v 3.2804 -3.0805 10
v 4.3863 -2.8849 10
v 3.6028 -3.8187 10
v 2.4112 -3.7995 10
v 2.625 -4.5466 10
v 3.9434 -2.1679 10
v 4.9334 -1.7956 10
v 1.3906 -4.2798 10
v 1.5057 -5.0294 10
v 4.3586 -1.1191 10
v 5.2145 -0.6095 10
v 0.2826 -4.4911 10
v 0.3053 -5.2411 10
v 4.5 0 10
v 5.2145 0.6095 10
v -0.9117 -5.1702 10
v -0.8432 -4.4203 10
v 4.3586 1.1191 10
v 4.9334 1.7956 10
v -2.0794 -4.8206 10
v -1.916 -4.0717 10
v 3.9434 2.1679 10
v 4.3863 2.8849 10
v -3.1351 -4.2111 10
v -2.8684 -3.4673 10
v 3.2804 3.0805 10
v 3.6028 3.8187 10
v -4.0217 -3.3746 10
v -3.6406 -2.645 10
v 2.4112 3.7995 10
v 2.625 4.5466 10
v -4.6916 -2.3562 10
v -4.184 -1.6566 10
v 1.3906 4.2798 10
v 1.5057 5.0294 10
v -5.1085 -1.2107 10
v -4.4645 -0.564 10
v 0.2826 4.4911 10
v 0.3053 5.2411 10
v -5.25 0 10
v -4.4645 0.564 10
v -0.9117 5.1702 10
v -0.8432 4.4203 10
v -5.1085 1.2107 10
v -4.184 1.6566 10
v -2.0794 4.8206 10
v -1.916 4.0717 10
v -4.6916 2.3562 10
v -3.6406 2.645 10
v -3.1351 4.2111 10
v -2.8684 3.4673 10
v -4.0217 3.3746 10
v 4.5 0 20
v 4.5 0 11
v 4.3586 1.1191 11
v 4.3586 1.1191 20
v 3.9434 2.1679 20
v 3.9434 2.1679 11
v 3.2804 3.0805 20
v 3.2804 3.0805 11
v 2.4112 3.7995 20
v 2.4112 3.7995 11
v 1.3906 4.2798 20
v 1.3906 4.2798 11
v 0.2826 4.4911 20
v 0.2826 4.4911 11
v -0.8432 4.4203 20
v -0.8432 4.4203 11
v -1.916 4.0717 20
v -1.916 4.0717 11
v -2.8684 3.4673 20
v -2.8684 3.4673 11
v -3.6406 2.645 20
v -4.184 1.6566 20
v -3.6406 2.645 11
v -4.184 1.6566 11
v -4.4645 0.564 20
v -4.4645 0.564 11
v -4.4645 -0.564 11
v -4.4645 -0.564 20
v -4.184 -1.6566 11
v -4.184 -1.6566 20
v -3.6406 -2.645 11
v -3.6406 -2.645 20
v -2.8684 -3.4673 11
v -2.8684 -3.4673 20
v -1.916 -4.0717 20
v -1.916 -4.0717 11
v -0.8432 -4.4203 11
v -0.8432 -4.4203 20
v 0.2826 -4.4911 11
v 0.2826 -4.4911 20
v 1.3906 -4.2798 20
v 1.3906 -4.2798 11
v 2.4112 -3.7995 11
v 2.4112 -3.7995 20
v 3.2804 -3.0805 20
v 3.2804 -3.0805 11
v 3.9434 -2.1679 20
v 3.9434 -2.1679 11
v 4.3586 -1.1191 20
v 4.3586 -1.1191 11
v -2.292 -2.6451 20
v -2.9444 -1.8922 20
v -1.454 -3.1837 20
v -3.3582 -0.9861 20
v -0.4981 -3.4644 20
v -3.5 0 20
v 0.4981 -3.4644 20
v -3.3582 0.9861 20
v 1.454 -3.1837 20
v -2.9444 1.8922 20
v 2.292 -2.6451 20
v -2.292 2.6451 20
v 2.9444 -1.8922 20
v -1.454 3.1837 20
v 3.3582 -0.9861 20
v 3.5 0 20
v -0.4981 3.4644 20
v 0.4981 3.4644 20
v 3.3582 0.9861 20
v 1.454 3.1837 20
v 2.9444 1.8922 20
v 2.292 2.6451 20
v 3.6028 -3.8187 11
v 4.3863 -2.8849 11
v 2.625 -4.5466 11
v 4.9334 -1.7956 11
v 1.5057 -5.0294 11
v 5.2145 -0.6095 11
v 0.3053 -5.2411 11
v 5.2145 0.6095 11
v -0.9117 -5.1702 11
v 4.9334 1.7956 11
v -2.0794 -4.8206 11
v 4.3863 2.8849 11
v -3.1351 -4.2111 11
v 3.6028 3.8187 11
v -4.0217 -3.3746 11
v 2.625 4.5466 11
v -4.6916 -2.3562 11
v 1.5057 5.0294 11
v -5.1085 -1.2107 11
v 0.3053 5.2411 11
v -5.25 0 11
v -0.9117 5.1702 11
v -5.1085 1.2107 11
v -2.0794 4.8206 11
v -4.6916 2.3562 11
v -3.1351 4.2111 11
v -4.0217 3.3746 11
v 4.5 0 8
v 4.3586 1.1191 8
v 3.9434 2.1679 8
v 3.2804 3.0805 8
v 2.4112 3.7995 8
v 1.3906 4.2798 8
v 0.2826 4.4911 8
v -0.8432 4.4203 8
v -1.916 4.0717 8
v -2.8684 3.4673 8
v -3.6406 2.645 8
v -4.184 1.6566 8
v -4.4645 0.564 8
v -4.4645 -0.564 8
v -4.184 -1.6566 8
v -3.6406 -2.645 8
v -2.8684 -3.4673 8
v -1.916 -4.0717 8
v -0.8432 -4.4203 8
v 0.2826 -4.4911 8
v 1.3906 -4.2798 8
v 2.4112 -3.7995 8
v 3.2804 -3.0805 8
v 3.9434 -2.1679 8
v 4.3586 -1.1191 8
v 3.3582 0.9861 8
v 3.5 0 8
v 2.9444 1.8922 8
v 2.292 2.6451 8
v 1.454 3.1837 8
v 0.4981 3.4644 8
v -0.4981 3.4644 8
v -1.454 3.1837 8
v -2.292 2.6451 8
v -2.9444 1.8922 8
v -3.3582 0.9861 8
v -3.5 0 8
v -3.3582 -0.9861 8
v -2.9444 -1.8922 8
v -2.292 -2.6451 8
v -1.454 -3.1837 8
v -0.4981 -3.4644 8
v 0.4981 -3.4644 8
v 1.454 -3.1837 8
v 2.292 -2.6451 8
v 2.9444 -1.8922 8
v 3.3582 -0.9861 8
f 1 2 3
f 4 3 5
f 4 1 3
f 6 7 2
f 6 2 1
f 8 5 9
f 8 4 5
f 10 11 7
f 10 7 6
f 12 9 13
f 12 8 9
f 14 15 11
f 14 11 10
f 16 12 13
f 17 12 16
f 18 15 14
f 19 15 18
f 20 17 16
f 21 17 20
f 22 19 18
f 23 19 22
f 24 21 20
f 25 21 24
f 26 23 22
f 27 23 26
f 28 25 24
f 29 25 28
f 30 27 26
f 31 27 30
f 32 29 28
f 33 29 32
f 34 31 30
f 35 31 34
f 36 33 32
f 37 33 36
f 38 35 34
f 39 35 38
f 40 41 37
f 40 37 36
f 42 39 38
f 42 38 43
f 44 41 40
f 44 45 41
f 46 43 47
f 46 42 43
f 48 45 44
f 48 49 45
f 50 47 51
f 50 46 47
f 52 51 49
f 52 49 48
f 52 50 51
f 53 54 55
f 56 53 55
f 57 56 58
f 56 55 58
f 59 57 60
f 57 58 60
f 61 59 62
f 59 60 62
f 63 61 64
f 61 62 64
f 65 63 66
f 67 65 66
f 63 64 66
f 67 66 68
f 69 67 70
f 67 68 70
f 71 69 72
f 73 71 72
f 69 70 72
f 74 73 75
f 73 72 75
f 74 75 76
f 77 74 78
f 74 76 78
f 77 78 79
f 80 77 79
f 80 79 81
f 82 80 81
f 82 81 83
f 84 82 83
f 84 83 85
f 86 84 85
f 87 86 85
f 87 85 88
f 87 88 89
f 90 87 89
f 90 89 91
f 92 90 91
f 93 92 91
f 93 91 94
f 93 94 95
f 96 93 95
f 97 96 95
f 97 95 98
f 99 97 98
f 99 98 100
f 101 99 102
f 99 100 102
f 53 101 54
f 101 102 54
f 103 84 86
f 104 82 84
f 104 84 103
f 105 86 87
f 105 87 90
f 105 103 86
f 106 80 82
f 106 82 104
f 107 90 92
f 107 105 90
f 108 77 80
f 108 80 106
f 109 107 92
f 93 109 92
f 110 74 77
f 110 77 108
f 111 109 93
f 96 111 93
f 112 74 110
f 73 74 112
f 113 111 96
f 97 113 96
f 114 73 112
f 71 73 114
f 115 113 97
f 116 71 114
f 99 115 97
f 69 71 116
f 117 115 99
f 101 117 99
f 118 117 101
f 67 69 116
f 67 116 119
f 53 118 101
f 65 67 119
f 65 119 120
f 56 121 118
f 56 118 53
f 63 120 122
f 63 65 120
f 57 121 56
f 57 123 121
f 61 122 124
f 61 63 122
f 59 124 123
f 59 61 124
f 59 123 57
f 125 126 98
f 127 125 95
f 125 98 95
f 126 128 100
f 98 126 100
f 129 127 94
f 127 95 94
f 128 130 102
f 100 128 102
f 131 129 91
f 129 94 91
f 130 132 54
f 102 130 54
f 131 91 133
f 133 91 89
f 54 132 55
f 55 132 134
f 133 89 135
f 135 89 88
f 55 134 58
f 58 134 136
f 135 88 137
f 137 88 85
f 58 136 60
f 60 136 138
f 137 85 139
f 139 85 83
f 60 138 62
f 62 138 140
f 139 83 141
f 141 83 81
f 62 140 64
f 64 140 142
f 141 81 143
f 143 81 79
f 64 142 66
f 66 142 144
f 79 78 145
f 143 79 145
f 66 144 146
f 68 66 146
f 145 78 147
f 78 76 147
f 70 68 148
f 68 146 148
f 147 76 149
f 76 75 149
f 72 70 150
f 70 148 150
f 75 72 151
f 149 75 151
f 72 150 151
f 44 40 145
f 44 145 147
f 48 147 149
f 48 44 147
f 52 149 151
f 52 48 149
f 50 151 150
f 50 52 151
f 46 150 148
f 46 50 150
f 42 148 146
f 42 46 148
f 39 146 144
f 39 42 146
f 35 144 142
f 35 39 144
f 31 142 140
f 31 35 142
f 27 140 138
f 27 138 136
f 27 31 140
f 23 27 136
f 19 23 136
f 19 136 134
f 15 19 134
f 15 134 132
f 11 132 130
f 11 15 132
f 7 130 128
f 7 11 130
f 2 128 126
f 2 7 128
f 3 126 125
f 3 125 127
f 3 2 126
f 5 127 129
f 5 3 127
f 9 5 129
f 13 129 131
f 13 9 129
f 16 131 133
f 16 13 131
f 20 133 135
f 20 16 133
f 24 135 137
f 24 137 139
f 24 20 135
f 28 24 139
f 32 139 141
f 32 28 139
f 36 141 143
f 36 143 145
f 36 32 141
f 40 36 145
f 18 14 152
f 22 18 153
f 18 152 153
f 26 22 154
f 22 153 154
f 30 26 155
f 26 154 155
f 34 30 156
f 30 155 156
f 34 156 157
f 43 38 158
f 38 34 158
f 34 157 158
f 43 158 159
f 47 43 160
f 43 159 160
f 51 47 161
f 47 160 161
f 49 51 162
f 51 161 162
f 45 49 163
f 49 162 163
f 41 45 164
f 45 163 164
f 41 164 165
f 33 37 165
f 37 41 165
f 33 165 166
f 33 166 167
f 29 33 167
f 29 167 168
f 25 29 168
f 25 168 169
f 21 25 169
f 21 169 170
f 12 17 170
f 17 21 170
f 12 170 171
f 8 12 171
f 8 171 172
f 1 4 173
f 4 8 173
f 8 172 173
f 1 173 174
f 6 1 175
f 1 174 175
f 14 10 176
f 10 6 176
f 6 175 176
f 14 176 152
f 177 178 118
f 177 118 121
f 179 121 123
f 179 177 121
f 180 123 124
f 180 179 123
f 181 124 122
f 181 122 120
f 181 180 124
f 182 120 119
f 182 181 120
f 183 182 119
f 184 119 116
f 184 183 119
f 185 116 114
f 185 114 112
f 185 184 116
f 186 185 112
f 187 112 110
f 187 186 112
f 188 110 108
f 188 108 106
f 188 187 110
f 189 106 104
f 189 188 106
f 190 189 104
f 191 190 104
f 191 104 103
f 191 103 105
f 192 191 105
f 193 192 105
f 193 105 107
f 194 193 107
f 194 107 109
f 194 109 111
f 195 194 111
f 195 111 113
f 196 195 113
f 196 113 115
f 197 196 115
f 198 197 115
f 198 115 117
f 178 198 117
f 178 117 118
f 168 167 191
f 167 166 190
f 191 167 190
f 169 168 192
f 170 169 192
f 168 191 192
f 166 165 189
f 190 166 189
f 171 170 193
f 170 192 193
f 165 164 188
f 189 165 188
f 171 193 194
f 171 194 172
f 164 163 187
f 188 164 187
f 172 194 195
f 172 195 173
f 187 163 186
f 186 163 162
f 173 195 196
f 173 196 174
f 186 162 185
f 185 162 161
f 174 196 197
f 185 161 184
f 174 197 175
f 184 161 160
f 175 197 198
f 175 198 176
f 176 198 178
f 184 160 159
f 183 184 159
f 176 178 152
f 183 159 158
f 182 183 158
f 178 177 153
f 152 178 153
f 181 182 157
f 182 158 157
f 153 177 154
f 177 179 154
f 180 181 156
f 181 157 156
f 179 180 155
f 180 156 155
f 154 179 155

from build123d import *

# Parameters (mm, degrees)
BOSS_EXTRUDE1_START = 8
SKETCH1_R           = 4.5
SKETCH1_R_2         = 3.5
BOSS_EXTRUDE1_DEPTH = 12
BOSS_EXTRUDE2_START = -2
SKETCH2_R           = 5.25
SKETCH2_R_2         = 3.5
BOSS_EXTRUDE2_DEPTH = 1


with BuildPart() as part:
    # Sketch1 → Boss-Extrude1 (new body)
    with BuildSketch(Plane.XY.offset(BOSS_EXTRUDE1_START)):
        Circle(SKETCH1_R)
        Circle(SKETCH1_R_2, mode=Mode.SUBTRACT)
    extrude(amount=BOSS_EXTRUDE1_DEPTH)

    # Sketch2 → Boss-Extrude2 (add)
    with BuildSketch(Plane(origin=(0, 0, 8), x_dir=(-1, 0, 0), z_dir=(0, 0, -1)).offset(BOSS_EXTRUDE2_START)):
        Circle(SKETCH2_R)
        Circle(SKETCH2_R_2, mode=Mode.SUBTRACT)
    extrude(amount=-BOSS_EXTRUDE2_DEPTH)


solid = part.part
